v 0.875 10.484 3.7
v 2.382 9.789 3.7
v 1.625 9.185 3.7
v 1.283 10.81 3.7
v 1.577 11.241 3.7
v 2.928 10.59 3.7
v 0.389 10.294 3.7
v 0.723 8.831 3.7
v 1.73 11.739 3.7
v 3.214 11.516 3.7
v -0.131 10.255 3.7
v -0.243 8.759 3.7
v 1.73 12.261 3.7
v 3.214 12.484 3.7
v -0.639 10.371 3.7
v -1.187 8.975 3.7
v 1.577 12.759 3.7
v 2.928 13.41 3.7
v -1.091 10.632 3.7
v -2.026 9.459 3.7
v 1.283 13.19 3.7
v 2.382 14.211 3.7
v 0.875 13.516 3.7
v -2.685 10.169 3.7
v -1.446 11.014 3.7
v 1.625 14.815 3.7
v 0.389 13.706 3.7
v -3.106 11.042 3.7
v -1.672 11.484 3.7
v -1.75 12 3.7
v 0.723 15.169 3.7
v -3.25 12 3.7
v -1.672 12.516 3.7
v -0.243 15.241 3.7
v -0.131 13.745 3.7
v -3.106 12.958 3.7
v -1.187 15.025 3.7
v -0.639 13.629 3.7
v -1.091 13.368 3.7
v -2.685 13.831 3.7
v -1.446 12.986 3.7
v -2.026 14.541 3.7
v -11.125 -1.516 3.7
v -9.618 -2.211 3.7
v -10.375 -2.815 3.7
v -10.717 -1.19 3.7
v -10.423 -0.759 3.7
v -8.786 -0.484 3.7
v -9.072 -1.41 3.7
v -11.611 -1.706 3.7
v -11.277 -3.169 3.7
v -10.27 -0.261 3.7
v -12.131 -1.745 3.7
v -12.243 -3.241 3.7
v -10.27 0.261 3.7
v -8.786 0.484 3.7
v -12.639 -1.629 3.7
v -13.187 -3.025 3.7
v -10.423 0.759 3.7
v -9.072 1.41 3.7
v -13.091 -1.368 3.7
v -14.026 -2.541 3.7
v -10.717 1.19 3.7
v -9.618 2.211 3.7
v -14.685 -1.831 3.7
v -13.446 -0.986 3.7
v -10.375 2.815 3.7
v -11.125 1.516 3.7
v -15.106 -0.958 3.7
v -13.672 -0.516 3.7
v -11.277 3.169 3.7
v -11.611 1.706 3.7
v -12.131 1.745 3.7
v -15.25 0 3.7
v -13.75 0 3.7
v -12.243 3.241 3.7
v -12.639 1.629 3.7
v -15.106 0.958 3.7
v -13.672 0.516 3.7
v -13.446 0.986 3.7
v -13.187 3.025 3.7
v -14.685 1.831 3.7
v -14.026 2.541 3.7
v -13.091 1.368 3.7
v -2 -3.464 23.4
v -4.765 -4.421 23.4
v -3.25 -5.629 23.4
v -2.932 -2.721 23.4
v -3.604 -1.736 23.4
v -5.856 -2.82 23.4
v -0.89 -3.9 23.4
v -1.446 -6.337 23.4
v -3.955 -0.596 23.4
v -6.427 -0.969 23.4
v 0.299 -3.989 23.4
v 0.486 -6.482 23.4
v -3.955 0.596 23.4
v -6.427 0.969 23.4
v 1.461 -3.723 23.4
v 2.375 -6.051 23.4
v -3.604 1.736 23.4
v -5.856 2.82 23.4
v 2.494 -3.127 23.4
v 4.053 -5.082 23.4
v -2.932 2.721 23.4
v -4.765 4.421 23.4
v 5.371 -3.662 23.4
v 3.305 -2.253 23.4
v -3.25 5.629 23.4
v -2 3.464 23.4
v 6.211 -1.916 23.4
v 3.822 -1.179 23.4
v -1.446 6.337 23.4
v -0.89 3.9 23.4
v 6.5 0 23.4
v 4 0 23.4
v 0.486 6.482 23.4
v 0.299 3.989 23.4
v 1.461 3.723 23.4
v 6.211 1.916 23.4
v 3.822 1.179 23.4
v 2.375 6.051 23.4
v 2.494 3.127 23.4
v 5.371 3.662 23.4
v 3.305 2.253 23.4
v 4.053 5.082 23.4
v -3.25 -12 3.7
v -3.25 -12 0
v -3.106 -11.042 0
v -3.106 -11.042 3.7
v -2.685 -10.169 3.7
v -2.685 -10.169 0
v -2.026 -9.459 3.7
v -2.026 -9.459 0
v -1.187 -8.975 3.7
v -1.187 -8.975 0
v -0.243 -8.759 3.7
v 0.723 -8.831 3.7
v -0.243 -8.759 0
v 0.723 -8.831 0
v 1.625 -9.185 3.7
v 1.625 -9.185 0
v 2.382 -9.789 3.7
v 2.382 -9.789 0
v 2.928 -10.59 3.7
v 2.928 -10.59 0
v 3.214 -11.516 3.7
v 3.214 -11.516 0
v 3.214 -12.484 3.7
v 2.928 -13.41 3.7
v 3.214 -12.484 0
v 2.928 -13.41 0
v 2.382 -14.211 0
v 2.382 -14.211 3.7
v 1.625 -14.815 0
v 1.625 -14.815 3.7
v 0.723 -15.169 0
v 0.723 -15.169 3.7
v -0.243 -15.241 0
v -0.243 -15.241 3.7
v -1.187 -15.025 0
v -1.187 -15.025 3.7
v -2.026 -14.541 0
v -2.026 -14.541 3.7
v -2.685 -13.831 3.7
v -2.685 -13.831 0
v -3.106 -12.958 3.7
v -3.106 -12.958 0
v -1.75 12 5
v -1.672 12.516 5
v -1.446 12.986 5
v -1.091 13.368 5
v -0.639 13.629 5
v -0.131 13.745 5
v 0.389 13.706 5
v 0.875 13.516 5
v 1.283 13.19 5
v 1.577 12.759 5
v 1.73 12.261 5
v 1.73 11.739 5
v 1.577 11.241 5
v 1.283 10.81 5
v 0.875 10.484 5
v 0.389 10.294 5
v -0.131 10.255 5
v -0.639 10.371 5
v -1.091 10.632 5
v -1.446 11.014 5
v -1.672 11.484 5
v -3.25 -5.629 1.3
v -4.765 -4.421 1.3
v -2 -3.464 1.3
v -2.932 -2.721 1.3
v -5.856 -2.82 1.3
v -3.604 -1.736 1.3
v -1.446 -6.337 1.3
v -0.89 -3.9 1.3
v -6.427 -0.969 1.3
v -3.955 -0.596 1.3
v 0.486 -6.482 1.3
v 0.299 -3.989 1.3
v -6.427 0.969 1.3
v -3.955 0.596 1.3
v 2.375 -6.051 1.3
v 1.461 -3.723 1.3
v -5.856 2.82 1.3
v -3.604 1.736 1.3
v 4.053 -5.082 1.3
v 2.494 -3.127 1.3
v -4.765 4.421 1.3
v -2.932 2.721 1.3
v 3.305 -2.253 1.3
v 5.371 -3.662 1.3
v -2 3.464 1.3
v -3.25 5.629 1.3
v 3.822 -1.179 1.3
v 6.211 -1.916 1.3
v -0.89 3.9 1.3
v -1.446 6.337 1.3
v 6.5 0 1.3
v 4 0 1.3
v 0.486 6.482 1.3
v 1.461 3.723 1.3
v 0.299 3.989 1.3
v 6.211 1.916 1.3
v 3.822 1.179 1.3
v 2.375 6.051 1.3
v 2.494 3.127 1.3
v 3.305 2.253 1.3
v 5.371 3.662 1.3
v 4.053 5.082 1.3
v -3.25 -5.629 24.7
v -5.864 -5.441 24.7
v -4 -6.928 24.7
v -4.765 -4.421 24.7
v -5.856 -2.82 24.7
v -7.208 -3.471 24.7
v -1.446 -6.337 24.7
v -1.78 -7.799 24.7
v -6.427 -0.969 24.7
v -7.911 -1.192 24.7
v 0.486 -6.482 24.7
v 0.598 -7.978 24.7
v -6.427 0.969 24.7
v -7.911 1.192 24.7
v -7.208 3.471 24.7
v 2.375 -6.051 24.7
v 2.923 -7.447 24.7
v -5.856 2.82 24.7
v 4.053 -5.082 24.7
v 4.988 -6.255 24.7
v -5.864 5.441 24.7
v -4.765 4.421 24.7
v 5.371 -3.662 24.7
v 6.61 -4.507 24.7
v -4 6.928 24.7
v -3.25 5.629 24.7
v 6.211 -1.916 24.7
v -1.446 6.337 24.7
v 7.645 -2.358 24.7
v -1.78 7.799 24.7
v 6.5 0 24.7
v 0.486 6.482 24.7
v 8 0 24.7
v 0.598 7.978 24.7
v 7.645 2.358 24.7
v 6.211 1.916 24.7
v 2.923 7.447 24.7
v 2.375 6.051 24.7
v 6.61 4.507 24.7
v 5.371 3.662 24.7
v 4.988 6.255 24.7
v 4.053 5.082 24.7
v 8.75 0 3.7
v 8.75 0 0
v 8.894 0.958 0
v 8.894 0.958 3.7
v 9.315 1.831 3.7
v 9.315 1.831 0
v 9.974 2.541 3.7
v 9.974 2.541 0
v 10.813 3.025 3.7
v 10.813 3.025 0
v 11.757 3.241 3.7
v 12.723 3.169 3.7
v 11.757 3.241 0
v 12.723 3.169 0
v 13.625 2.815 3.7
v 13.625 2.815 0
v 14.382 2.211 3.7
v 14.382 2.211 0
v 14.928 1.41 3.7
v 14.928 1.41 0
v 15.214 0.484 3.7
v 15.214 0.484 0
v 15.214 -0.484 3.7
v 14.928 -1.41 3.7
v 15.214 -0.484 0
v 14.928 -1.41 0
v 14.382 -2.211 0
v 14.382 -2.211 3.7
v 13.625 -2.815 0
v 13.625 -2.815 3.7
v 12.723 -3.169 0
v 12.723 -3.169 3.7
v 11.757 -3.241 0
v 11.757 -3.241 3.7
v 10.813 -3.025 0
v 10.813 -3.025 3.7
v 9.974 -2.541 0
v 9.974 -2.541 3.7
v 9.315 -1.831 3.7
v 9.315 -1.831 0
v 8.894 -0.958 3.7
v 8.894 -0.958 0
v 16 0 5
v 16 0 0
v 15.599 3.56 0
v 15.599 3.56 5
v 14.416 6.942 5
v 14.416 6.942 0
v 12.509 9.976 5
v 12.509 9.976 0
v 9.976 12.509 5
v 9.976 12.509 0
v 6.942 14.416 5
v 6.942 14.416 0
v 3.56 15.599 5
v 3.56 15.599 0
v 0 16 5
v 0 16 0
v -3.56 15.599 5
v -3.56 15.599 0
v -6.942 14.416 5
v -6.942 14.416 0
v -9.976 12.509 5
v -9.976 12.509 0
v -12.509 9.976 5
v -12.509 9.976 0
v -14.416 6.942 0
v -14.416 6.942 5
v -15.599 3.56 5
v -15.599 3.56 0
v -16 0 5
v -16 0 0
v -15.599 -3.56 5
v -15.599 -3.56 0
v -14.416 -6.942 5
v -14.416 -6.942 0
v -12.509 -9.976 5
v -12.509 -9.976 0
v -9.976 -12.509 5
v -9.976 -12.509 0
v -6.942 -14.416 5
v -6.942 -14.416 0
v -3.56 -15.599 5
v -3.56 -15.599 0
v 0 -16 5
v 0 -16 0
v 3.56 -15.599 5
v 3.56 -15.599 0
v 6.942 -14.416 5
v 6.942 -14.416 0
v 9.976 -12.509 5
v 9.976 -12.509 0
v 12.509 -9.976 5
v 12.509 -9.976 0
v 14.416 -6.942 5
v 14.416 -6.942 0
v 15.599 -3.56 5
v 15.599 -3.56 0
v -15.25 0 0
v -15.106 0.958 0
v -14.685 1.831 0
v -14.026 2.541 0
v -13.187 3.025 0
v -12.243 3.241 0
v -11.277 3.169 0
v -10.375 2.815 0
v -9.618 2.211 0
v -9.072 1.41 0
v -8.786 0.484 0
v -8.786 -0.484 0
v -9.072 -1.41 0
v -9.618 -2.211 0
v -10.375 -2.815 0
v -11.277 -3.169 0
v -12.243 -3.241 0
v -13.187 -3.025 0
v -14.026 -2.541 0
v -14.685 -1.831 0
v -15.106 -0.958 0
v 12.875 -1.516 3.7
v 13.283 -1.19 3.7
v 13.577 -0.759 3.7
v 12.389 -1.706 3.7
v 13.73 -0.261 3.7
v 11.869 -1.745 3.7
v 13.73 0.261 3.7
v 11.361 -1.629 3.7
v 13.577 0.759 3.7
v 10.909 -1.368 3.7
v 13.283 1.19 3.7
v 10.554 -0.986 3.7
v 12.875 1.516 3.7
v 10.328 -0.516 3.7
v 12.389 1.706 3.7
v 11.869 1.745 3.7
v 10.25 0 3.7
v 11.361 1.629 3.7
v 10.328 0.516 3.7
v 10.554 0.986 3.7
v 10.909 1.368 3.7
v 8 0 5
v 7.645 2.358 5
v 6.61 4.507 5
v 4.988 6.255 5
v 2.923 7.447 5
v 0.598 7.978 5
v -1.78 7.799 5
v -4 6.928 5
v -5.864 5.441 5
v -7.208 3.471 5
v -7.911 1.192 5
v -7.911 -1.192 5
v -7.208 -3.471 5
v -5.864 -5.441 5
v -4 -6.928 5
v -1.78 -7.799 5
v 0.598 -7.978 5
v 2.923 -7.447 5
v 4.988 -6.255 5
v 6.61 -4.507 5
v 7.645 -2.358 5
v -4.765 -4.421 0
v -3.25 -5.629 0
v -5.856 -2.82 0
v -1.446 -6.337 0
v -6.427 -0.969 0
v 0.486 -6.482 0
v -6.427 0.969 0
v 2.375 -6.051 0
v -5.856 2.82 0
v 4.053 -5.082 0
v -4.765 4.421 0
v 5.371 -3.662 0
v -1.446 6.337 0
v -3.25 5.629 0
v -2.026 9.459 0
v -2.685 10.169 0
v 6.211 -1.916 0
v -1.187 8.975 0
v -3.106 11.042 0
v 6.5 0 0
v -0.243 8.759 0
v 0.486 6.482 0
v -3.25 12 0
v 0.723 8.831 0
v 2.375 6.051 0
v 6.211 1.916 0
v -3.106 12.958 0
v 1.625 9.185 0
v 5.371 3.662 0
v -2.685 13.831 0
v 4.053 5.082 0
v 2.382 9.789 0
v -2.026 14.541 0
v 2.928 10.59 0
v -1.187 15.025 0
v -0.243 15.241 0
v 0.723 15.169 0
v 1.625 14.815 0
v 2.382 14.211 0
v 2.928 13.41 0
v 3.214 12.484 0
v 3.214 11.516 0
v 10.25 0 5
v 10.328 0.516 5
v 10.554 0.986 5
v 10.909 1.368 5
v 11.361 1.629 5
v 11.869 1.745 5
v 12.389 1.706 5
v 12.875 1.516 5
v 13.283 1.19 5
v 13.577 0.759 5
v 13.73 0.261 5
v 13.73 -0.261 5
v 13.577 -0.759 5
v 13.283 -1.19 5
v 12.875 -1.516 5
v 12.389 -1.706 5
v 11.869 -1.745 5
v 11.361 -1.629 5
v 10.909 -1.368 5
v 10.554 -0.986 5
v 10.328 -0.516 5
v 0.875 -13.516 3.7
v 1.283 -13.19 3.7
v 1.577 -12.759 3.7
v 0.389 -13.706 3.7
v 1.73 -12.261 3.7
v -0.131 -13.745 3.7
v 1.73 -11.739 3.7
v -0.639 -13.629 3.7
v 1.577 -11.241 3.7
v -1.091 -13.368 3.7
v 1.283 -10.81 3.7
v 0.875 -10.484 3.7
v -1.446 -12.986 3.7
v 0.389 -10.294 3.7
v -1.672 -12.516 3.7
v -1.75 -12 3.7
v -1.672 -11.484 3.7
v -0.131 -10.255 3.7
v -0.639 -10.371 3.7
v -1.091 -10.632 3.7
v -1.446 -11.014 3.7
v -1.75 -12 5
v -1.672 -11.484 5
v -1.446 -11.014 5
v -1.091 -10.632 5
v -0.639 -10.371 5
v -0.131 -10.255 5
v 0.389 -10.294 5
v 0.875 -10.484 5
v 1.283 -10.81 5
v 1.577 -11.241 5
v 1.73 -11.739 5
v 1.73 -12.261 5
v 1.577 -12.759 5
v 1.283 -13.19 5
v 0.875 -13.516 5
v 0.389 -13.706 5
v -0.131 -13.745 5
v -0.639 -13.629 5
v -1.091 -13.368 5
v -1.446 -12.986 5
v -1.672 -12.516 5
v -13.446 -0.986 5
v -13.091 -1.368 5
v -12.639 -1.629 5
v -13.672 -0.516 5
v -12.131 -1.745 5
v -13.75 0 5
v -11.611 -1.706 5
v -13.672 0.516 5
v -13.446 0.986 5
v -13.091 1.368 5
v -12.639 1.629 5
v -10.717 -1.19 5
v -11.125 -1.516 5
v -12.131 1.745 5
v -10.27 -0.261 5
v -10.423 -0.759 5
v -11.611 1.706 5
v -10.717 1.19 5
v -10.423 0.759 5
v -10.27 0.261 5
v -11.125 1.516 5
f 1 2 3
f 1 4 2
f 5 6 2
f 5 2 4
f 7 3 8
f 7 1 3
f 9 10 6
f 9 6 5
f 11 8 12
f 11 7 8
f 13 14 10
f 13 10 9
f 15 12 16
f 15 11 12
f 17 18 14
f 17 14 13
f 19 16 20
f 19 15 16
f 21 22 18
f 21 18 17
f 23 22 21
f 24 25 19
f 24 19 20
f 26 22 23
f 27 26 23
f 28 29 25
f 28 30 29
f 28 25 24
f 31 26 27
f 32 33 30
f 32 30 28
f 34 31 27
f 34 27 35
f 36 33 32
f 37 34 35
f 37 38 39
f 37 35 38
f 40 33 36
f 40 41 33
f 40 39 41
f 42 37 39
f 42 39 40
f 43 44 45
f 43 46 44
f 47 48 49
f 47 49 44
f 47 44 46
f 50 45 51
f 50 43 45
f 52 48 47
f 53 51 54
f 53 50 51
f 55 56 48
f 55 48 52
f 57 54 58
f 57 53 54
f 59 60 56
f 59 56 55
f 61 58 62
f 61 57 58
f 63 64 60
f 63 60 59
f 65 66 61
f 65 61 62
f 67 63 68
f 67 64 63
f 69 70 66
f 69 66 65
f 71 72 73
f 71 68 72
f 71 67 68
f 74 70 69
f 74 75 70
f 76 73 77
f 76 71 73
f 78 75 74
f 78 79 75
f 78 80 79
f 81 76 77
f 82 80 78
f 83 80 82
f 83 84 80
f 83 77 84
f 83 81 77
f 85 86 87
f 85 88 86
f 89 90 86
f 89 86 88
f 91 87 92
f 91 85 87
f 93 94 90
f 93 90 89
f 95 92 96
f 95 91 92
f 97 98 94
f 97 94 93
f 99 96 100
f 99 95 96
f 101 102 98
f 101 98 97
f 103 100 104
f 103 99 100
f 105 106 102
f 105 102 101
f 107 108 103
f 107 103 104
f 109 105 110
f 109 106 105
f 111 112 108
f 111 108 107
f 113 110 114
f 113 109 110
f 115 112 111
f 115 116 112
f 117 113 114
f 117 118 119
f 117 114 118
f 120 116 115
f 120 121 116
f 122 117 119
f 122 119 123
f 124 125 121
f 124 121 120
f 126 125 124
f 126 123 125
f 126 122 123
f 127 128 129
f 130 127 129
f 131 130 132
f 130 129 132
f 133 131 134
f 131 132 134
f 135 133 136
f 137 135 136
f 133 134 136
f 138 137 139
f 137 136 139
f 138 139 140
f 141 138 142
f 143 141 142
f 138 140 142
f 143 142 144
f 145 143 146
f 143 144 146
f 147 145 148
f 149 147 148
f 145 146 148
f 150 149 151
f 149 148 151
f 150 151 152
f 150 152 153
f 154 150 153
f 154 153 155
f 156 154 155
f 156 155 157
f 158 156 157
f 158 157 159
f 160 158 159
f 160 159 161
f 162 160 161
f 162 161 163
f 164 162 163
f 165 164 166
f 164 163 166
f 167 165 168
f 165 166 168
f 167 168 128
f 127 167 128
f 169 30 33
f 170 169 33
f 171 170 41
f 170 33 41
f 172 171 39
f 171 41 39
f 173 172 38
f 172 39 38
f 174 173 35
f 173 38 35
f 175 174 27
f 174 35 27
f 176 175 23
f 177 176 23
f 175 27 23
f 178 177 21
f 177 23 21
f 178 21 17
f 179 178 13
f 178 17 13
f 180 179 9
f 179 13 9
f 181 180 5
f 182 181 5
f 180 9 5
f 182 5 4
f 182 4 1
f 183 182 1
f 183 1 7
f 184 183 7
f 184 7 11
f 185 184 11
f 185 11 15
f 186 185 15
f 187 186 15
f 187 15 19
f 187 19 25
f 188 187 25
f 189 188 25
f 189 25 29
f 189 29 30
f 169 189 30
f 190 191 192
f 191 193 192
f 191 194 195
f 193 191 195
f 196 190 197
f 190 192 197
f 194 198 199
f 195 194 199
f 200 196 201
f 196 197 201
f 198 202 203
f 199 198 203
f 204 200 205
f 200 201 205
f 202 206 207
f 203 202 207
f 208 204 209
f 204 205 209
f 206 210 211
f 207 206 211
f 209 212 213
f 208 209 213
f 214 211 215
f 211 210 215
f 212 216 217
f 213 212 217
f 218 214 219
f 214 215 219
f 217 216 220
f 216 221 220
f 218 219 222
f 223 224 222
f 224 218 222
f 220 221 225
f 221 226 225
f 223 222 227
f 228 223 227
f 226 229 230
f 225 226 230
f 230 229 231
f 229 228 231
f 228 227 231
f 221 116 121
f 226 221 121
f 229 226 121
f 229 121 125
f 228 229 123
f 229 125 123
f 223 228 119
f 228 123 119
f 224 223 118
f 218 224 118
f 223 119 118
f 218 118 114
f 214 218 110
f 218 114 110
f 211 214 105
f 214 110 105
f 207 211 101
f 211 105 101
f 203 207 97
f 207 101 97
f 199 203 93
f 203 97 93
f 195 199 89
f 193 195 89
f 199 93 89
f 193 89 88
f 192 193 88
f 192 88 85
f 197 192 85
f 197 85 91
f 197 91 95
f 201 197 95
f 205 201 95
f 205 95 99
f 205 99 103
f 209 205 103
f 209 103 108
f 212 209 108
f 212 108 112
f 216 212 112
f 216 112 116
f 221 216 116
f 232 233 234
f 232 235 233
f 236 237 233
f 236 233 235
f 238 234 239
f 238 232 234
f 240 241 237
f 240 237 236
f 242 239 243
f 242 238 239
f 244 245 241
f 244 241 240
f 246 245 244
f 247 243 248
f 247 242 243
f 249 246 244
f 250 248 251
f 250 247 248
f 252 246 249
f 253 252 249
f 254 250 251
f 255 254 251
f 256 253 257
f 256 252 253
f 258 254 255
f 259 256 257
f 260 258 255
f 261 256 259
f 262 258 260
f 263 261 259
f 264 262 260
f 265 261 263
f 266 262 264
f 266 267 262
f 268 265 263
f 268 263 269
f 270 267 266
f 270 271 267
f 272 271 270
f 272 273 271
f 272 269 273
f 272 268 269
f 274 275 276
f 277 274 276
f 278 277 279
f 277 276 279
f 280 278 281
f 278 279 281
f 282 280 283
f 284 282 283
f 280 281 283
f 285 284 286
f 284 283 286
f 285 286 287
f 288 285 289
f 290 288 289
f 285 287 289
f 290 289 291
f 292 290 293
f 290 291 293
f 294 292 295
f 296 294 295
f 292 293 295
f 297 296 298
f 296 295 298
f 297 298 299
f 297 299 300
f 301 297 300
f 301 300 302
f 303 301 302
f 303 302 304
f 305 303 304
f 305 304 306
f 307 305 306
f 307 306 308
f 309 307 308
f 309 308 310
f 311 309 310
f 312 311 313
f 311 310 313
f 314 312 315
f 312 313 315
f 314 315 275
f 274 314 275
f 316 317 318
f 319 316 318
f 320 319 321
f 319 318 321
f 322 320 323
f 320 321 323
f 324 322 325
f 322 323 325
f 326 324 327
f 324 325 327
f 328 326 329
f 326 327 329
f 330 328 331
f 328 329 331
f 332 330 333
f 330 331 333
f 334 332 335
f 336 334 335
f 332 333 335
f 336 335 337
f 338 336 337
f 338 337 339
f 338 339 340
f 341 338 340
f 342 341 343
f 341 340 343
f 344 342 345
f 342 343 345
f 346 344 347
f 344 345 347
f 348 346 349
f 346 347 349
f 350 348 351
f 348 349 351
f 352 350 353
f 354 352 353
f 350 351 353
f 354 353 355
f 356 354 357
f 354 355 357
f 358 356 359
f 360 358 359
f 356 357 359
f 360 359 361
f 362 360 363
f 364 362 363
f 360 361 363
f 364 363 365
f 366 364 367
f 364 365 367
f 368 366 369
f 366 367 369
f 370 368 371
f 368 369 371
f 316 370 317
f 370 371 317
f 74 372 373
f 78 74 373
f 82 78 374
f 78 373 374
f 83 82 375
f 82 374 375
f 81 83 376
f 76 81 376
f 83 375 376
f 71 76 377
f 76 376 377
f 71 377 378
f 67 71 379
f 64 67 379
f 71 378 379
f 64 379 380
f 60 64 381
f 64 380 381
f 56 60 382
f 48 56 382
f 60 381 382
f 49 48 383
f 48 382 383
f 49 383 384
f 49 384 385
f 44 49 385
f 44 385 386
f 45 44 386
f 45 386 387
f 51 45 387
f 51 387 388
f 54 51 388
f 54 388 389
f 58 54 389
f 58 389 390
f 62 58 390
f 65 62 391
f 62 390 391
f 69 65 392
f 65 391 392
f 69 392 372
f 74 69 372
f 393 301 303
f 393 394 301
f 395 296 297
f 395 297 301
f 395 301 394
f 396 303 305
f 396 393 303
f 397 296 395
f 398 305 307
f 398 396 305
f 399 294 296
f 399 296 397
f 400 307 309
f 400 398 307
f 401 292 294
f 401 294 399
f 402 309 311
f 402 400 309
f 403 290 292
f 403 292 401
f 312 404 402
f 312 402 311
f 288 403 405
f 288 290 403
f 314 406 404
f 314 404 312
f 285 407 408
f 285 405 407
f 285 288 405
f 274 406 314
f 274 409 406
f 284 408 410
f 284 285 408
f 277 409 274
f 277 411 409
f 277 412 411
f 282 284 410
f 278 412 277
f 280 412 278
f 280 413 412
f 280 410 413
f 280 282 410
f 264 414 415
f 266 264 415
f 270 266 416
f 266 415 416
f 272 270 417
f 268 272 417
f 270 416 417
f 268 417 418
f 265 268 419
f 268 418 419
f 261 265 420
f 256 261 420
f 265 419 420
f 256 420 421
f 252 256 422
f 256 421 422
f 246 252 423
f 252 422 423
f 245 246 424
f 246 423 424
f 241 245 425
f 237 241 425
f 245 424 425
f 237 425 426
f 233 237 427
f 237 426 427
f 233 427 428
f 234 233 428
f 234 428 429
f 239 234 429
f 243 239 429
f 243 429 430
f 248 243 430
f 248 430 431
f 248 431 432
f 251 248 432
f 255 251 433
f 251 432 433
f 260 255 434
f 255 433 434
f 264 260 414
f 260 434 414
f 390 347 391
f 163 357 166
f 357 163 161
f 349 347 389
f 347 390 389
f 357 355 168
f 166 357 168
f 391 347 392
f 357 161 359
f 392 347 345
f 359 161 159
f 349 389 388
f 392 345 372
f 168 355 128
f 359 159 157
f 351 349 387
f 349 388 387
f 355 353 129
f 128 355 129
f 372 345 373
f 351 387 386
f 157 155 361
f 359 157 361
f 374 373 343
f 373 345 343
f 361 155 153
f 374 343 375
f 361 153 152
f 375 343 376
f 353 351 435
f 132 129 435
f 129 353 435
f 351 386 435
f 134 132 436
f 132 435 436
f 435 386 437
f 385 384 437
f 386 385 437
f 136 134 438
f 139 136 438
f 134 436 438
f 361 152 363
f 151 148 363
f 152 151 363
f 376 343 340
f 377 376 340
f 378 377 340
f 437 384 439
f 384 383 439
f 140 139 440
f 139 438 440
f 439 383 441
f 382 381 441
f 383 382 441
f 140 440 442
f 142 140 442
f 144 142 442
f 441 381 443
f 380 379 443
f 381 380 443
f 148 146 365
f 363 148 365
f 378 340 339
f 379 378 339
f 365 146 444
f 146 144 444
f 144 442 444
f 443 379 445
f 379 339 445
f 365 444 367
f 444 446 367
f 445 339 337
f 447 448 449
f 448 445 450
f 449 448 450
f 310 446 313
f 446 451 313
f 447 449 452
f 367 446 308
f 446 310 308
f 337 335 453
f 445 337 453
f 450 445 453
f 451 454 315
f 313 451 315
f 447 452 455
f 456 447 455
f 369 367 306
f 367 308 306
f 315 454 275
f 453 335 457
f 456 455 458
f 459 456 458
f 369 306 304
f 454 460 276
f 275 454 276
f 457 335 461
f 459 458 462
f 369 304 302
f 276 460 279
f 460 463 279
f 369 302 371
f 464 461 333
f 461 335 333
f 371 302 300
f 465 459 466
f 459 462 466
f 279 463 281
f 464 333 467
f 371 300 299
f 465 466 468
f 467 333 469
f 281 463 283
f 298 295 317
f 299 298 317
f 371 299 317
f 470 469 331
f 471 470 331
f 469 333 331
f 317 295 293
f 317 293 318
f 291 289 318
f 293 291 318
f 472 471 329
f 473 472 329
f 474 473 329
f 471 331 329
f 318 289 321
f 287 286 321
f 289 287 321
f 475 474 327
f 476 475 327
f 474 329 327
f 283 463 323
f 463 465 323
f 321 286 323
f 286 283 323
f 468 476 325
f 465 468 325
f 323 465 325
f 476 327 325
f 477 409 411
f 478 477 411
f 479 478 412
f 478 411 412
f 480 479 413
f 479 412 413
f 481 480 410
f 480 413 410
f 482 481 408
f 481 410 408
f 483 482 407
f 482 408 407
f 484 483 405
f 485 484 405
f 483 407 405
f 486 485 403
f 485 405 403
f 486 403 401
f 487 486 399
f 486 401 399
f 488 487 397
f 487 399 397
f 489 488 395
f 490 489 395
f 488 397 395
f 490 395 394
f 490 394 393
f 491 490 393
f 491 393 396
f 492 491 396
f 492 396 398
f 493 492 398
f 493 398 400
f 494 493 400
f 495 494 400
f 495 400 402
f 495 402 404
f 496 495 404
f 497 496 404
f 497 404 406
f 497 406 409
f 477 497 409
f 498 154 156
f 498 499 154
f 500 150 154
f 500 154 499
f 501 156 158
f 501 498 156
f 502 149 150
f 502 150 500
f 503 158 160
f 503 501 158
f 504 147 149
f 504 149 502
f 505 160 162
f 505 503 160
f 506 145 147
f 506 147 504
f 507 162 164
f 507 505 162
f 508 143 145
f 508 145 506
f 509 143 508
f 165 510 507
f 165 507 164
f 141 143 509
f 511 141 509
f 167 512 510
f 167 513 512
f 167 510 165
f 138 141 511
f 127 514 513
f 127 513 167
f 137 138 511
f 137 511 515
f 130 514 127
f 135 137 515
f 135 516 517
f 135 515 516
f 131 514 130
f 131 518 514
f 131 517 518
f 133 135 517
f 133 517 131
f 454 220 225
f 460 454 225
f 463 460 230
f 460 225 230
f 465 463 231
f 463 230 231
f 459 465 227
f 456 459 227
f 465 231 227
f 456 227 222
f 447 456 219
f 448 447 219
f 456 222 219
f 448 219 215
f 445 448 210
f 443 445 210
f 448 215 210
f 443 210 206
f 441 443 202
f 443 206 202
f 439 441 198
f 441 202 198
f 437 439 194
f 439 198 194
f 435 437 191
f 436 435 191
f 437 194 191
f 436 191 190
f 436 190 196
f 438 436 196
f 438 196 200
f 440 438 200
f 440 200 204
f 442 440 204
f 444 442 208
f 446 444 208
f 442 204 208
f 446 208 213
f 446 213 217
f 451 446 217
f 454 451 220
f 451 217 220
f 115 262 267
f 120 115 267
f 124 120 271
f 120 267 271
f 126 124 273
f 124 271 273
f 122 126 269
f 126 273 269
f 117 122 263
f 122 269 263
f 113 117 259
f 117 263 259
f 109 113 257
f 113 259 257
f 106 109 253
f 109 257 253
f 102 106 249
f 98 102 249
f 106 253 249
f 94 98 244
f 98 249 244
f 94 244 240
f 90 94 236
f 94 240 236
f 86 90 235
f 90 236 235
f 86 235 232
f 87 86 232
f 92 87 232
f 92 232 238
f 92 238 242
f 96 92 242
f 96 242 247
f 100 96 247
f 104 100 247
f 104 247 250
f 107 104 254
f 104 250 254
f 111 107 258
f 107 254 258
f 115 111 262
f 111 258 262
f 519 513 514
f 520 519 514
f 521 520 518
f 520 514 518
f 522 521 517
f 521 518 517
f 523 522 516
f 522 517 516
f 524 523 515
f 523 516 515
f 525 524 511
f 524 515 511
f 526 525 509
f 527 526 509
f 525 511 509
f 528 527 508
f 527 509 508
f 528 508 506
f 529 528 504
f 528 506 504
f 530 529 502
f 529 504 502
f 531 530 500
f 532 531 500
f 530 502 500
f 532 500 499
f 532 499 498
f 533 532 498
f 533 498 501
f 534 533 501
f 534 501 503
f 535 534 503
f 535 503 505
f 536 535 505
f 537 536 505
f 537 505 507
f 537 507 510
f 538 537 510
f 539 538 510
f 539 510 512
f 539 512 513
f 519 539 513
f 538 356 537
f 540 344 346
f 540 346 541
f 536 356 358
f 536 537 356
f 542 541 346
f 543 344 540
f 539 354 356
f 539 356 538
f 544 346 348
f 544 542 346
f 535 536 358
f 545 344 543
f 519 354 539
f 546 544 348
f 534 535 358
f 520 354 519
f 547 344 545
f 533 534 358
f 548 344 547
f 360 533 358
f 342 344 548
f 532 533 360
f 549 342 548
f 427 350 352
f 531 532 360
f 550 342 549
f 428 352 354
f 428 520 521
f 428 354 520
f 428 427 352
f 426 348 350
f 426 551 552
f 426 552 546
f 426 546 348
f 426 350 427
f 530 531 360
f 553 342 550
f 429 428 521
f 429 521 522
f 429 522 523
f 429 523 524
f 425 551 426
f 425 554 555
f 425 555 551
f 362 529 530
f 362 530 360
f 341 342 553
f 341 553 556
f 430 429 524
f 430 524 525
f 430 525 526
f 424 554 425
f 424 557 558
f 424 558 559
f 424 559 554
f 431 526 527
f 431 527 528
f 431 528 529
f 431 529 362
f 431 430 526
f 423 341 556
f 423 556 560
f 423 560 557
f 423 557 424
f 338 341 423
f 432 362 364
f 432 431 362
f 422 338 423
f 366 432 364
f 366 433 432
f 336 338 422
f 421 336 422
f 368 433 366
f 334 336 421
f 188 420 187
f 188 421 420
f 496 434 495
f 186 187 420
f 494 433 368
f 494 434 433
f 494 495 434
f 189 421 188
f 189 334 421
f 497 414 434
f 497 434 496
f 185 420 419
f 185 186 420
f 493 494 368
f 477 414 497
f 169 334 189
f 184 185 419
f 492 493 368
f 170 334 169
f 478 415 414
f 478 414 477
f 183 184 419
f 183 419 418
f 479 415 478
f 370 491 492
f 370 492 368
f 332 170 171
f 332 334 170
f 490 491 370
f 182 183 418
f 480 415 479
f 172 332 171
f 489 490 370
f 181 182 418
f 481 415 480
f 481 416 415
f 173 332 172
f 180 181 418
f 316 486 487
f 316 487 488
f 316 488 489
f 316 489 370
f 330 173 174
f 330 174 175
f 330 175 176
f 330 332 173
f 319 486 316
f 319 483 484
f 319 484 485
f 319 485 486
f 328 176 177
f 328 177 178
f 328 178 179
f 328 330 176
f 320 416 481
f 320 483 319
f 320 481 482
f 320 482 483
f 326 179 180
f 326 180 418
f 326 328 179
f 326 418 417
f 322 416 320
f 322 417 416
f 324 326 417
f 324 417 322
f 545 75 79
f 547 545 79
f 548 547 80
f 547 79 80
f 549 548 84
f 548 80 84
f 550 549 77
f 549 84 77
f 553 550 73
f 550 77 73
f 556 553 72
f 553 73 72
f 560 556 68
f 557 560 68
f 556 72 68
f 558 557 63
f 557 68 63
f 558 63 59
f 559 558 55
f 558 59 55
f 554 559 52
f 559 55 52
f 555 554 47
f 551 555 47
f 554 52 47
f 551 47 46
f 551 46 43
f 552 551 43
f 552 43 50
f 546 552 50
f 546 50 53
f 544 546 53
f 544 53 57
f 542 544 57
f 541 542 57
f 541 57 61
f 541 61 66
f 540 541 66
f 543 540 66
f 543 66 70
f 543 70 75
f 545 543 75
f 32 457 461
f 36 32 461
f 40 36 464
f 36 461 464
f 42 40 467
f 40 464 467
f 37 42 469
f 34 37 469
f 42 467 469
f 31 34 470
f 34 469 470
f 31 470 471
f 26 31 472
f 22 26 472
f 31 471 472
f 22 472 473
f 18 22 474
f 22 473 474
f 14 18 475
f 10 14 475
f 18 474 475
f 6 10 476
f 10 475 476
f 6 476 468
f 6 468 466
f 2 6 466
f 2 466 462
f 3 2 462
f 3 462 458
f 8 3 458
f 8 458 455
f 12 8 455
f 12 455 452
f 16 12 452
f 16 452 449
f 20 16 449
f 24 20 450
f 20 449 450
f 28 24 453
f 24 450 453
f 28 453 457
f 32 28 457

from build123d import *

# Parameters (mm, degrees)
IZIM1_R                     = 16
Y_KSEKLIK_EKSTR_ZYON1_DEPTH = 5
IZIM2_R                     = 8
Y_KSEKLIK_EKSTR_ZYON2_DEPTH = 19.7
KES_EKSTR_ZYON1_REACH       = 35.498
IZIM3_R                     = 4
KES_EKSTR_ZYON2_REACH       = 35.498
IZIM4_R                     = 1.75
IZIM4_3_R                   = 3.25
IZIM4_3_R_2                 = 1.75
KES_EKSTR_ZYON3_DEPTH       = 3.7
IZIM5_R                     = 6.5
KES_EKSTR_ZYON4_DEPTH       = 1.3
KES_EKSTR_ZYON5_START       = -23.4
IZIM5_2_R                   = 6.5
KES_EKSTR_ZYON5_DEPTH       = 1.3


with BuildPart() as part:
    # Çizim1 → Yükseklik-Ekstrüzyon1 (new body)
    with BuildSketch(Plane.XY):
        Circle(IZIM1_R)
    extrude(amount=Y_KSEKLIK_EKSTR_ZYON1_DEPTH)

    # Çizim2 → Yükseklik-Ekstrüzyon2 (add)
    with BuildSketch(Plane.XY.offset(5)):
        Circle(IZIM2_R)
    extrude(amount=Y_KSEKLIK_EKSTR_ZYON2_DEPTH)

    # Çizim3 → Kes-Ekstrüzyon1 (cut, up to next)
    with BuildSketch(Plane.XY.offset(24.7), mode=Mode.PRIVATE) as kes_ekstr_zyon1_sk1:
        Circle(IZIM3_R)
    kes_ekstr_zyon1_tool1 = extrude(kes_ekstr_zyon1_sk1.sketch, amount=-KES_EKSTR_ZYON1_REACH, mode=Mode.PRIVATE) & part.part
    add(kes_ekstr_zyon1_tool1.solids().sort_by_distance((0, 0, 24.7))[0], mode=Mode.SUBTRACT)

    # Çizim4 → Kes-Ekstrüzyon2 (cut, up to next)
    with BuildSketch(Plane(origin=(0, 0, 0), x_dir=(-1, 0, 0), z_dir=(0, 0, -1)), mode=Mode.PRIVATE) as kes_ekstr_zyon2_sk1:
        with Locations((0, 12)):
            Circle(IZIM4_R)
    kes_ekstr_zyon2_tool1 = extrude(kes_ekstr_zyon2_sk1.sketch, amount=-KES_EKSTR_ZYON2_REACH, mode=Mode.PRIVATE) & part.part
    # Çizim4 → Kes-Ekstrüzyon2 (cut, up to next)
    with BuildSketch(Plane(origin=(0, 0, 0), x_dir=(-1, 0, 0), z_dir=(0, 0, -1)), mode=Mode.PRIVATE) as kes_ekstr_zyon2_sk2:
        with Locations((12, 0)):
            Circle(IZIM4_R)
    kes_ekstr_zyon2_tool2 = extrude(kes_ekstr_zyon2_sk2.sketch, amount=-KES_EKSTR_ZYON2_REACH, mode=Mode.PRIVATE) & part.part
    # Çizim4 → Kes-Ekstrüzyon2 (cut, up to next)
    with BuildSketch(Plane(origin=(0, 0, 0), x_dir=(-1, 0, 0), z_dir=(0, 0, -1)), mode=Mode.PRIVATE) as kes_ekstr_zyon2_sk3:
        with Locations((0, -12)):
            Circle(IZIM4_R)
    kes_ekstr_zyon2_tool3 = extrude(kes_ekstr_zyon2_sk3.sketch, amount=-KES_EKSTR_ZYON2_REACH, mode=Mode.PRIVATE) & part.part
    # Çizim4 → Kes-Ekstrüzyon2 (cut, up to next)
    with BuildSketch(Plane(origin=(0, 0, 0), x_dir=(-1, 0, 0), z_dir=(0, 0, -1)), mode=Mode.PRIVATE) as kes_ekstr_zyon2_sk4:
        with Locations((-12, 0)):
            Circle(IZIM4_R)
    kes_ekstr_zyon2_tool4 = extrude(kes_ekstr_zyon2_sk4.sketch, amount=-KES_EKSTR_ZYON2_REACH, mode=Mode.PRIVATE) & part.part
    add(kes_ekstr_zyon2_tool1.solids().sort_by_distance((0, 12, 0))[0], mode=Mode.SUBTRACT)
    add(kes_ekstr_zyon2_tool2.solids().sort_by_distance((-12, 0, 0))[0], mode=Mode.SUBTRACT)
    add(kes_ekstr_zyon2_tool3.solids().sort_by_distance((0, -12, 0))[0], mode=Mode.SUBTRACT)
    add(kes_ekstr_zyon2_tool4.solids().sort_by_distance((12, 0, 0))[0], mode=Mode.SUBTRACT)

    # Çizim4<3> → Kes-Ekstrüzyon3 (cut)
    # profile 1 of 4: a face of its own
    with BuildSketch(Plane(origin=(0, 0, 0), x_dir=(-1, 0, 0), z_dir=(0, 0, -1))):
        with Locations((0, 12)):
            Circle(IZIM4_3_R)
        with Locations((0, 12)):
            Circle(IZIM4_3_R_2, mode=Mode.SUBTRACT)
    # profile 2 of 4: a face of its own
    with BuildSketch(Plane(origin=(0, 0, 0), x_dir=(-1, 0, 0), z_dir=(0, 0, -1))):
        with Locations((12, 0)):
            Circle(IZIM4_3_R)
        with Locations((12, 0)):
            Circle(IZIM4_3_R_2, mode=Mode.SUBTRACT)
    # profile 3 of 4: a face of its own
    with BuildSketch(Plane(origin=(0, 0, 0), x_dir=(-1, 0, 0), z_dir=(0, 0, -1))):
        with Locations((0, -12)):
            Circle(IZIM4_3_R)
        with Locations((0, -12)):
            Circle(IZIM4_3_R_2, mode=Mode.SUBTRACT)
    # profile 4 of 4: a face of its own
    with BuildSketch(Plane(origin=(0, 0, 0), x_dir=(-1, 0, 0), z_dir=(0, 0, -1))):
        with Locations((-12, 0)):
            Circle(IZIM4_3_R)
        with Locations((-12, 0)):
            Circle(IZIM4_3_R_2, mode=Mode.SUBTRACT)
    extrude(amount=-KES_EKSTR_ZYON3_DEPTH, mode=Mode.SUBTRACT)

    # Çizim5 → Kes-Ekstrüzyon4 (cut)
    with BuildSketch(Plane.XY.offset(24.7)):
        Circle(IZIM5_R)
    extrude(amount=-KES_EKSTR_ZYON4_DEPTH, mode=Mode.SUBTRACT)

    # Çizim5<2> → Kes-Ekstrüzyon5 (cut)
    with BuildSketch(Plane.XY.offset(24.7).offset(KES_EKSTR_ZYON5_START)):
        Circle(IZIM5_2_R)
    extrude(amount=-KES_EKSTR_ZYON5_DEPTH, mode=Mode.SUBTRACT)


solid = part.part
